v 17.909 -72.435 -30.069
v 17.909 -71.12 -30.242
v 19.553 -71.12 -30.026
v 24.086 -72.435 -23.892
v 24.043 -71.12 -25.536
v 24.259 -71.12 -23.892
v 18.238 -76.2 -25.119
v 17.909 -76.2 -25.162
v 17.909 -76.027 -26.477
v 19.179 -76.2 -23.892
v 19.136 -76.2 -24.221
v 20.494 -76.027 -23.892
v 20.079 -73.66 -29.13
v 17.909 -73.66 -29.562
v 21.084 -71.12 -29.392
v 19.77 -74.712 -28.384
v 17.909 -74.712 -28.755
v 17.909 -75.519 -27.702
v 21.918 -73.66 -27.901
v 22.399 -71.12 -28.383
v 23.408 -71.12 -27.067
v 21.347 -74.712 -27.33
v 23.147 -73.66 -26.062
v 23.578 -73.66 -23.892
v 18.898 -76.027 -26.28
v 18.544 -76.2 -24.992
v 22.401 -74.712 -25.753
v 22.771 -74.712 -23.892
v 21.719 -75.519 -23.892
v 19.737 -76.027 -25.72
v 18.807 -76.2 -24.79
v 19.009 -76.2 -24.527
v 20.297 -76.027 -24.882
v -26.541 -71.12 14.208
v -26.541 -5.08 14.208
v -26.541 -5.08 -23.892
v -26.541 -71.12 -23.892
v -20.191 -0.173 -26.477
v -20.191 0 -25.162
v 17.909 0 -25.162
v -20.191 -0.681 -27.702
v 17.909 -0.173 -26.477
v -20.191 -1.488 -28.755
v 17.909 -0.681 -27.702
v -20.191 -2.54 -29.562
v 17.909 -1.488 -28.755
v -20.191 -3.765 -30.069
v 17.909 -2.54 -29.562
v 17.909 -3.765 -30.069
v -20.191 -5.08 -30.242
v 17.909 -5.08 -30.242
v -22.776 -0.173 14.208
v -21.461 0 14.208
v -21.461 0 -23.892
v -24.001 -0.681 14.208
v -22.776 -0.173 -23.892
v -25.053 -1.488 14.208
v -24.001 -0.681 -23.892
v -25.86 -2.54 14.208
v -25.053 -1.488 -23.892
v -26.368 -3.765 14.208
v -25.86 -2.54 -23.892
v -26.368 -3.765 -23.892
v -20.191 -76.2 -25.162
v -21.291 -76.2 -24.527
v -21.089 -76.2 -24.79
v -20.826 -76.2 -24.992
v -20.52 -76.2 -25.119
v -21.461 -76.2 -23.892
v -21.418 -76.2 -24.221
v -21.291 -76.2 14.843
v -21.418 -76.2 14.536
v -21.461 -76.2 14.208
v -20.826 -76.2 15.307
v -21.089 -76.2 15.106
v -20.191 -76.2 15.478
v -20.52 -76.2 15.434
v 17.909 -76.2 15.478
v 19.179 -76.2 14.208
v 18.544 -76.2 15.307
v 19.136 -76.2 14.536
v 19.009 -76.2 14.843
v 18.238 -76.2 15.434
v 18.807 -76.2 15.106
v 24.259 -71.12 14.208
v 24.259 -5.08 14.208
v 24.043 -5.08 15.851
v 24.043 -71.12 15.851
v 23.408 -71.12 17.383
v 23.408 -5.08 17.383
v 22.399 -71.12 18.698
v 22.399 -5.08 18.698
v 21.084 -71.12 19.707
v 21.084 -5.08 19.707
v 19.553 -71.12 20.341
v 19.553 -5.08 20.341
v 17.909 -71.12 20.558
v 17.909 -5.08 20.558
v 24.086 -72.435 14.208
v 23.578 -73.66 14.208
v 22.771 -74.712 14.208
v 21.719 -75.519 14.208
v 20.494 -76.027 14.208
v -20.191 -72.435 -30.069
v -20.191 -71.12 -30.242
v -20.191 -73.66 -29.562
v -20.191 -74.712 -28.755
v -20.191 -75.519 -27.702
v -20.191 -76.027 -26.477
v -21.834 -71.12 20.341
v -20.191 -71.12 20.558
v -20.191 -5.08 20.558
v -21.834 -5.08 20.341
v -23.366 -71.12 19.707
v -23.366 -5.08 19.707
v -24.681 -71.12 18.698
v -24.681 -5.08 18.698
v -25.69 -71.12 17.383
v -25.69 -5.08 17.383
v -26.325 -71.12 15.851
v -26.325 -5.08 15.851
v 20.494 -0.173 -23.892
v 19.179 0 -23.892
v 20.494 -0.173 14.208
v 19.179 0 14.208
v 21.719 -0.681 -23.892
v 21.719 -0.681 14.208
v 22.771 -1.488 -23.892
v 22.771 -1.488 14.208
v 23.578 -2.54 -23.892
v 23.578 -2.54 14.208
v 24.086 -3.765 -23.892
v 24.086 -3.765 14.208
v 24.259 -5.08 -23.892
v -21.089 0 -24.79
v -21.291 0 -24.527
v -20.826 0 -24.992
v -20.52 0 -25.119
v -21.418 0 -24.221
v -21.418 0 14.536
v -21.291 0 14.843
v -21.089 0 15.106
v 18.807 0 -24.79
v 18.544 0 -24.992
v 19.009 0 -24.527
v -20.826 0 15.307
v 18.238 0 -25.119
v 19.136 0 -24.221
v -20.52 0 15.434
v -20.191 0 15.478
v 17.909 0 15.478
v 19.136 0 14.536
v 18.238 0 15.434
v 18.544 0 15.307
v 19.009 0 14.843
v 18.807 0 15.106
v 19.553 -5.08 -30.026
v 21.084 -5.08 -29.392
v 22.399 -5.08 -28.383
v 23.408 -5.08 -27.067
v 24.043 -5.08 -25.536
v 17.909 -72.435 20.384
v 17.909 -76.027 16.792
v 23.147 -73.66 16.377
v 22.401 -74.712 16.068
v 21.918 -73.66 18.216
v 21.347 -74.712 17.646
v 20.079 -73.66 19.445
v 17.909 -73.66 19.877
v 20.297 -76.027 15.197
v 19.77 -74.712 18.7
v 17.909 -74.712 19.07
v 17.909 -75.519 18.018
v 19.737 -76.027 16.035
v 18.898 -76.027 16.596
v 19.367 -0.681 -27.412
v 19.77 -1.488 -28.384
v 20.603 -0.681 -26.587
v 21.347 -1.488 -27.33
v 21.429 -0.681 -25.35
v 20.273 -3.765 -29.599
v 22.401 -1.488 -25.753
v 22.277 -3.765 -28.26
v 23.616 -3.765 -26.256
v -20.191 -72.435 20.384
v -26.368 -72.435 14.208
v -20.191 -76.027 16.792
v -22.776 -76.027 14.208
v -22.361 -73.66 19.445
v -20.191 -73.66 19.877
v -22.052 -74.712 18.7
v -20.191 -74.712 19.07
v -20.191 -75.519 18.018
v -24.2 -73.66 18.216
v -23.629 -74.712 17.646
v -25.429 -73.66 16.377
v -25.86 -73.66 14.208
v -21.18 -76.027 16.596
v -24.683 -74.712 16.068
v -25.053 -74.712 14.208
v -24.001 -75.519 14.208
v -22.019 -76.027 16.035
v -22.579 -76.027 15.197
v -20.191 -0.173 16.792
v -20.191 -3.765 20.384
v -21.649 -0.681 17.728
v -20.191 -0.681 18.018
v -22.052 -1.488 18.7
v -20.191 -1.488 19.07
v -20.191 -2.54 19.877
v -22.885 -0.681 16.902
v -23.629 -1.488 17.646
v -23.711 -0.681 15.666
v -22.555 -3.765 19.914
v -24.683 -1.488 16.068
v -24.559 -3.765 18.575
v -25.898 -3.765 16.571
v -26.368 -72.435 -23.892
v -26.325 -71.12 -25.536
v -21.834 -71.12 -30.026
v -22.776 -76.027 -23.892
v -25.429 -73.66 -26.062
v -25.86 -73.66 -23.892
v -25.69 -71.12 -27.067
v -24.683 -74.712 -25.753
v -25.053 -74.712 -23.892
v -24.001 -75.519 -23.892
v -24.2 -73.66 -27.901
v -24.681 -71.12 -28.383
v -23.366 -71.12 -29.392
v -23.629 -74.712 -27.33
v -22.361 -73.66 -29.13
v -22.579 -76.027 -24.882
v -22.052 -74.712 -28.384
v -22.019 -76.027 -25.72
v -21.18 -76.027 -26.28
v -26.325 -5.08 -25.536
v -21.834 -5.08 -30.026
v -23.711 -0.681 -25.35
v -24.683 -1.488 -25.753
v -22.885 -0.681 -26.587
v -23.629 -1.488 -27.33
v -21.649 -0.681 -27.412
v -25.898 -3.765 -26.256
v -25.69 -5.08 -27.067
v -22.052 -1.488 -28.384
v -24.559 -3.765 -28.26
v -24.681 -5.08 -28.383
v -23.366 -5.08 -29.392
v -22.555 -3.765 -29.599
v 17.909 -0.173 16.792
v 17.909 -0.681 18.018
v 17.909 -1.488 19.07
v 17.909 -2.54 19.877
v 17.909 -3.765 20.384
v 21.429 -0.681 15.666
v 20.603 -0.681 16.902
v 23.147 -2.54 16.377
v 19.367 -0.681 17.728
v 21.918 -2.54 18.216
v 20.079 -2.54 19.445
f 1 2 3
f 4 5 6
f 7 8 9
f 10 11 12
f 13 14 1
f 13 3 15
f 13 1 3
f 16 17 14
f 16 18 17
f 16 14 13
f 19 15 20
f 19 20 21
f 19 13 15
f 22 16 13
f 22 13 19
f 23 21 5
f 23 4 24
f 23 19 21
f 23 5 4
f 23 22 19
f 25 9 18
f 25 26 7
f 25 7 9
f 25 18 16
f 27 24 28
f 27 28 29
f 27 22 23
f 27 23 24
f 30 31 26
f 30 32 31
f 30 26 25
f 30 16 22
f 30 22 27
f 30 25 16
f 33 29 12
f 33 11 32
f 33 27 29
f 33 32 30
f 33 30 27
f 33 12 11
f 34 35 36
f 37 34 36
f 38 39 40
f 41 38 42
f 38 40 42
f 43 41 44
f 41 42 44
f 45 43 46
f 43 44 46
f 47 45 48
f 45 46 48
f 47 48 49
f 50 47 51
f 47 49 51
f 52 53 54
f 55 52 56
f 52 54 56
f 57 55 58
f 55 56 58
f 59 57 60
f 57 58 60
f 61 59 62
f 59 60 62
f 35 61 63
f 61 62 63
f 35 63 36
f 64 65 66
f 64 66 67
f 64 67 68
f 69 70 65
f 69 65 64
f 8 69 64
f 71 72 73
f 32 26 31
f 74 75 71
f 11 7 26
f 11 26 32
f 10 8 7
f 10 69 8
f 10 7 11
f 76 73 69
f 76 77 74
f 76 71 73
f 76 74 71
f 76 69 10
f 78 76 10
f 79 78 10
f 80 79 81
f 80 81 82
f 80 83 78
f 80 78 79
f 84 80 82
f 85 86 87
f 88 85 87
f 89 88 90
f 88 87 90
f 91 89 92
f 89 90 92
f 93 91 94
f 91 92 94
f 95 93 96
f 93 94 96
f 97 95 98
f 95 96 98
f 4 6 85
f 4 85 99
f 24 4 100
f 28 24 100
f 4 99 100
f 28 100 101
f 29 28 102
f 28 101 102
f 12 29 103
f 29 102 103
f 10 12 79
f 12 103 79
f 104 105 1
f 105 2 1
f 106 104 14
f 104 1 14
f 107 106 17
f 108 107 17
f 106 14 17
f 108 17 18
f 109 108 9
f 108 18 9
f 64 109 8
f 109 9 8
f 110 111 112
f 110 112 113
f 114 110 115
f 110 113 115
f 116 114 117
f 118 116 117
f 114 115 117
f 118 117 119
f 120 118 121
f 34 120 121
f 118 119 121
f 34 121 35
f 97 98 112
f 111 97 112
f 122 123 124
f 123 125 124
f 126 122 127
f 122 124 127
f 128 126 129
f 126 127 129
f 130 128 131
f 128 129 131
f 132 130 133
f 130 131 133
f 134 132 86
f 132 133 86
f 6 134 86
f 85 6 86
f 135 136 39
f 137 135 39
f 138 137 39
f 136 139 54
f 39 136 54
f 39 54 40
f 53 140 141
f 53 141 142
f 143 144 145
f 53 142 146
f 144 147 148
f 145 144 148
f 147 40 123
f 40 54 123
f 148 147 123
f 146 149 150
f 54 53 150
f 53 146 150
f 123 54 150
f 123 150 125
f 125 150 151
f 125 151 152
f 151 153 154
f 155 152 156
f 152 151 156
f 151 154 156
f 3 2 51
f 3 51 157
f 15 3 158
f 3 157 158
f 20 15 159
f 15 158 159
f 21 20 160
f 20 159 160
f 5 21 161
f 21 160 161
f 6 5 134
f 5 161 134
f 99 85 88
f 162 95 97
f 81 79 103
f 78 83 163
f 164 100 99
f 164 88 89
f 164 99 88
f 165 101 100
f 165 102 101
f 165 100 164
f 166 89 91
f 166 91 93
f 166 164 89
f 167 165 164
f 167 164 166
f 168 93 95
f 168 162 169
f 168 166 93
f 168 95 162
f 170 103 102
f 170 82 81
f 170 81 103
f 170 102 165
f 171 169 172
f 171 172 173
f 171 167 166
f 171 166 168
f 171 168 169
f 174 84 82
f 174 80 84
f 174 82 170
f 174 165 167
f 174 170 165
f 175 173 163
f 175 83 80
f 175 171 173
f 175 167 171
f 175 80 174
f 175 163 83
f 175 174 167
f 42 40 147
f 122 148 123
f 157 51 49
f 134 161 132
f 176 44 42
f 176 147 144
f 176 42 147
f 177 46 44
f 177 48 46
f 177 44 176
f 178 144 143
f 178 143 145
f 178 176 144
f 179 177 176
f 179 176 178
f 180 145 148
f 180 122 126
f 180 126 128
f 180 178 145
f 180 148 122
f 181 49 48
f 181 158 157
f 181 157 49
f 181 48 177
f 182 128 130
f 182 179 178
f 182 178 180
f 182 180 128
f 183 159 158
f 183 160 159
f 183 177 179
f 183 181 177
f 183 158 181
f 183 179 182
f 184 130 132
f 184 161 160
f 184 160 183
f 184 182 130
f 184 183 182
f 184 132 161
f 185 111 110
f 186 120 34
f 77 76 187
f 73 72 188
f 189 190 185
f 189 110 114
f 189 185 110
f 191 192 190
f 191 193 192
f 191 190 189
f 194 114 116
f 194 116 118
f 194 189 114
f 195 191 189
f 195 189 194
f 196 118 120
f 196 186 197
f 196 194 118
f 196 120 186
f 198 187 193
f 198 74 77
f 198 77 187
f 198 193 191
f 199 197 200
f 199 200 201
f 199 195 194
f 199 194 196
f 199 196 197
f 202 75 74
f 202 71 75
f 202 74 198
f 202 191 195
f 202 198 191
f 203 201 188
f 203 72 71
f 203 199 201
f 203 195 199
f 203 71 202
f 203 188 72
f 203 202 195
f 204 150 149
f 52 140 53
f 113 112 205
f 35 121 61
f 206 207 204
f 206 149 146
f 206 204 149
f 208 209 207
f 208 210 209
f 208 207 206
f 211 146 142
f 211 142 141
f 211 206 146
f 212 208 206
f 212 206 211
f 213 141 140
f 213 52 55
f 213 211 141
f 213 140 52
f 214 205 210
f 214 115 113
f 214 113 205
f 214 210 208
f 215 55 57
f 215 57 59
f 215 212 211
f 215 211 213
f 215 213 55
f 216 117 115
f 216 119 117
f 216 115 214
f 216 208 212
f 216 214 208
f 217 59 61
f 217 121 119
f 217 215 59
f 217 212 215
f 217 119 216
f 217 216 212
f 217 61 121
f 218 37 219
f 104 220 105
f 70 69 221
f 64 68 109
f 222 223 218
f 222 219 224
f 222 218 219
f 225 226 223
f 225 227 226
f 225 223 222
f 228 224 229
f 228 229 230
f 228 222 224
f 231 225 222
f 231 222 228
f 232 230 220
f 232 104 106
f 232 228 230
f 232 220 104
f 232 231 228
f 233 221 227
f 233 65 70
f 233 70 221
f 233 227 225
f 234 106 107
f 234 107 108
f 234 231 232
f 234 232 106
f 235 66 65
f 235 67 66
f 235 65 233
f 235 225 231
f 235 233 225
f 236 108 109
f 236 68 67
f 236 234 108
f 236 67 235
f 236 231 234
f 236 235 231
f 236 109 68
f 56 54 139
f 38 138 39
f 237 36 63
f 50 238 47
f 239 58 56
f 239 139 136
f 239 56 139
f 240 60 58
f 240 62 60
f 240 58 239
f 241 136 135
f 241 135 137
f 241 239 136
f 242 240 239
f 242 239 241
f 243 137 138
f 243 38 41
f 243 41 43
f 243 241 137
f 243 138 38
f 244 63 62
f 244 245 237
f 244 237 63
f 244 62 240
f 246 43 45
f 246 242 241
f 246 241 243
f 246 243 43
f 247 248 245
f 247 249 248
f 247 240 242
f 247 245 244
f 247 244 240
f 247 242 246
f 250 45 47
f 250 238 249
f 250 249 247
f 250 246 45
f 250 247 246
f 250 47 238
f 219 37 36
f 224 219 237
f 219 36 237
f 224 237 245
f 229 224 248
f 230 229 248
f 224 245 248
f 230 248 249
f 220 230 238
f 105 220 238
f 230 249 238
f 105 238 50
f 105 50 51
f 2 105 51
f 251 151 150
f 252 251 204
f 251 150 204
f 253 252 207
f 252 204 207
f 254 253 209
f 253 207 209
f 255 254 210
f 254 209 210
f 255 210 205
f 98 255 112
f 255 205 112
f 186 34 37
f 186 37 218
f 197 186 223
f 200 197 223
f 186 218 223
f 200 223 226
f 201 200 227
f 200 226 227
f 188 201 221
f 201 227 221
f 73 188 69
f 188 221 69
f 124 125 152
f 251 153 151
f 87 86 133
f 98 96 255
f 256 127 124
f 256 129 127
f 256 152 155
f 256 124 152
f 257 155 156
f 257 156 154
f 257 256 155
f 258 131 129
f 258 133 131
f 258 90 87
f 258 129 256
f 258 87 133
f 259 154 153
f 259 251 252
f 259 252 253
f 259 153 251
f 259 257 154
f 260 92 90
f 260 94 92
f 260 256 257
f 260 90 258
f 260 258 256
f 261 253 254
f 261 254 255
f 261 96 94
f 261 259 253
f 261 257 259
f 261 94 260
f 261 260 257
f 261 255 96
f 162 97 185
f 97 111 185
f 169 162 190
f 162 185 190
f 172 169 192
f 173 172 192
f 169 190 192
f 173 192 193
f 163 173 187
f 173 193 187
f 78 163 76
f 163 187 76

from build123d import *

# Parameters (mm, degrees)
F1_DEPTH = 25.4
F2_DEPTH = 50.8
F3_R     = 5.08
F4_R     = 5.08


with BuildPart() as f1:
    # F0 (on Front) → F1 (new body)
    with BuildSketch(Plane.XZ):
        with BuildLine():
            ThreePointArc((-20.1909632862, 20.5575729657), (-24.6810913467, 18.6977010262), (-26.5409632862, 14.2075729657))
            Line((-26.5409632862, 14.2075729657), (-26.5409632862, -23.8924270343))
            ThreePointArc((-26.5409632862, -23.8924270343), (-24.6810913467, -28.3825550948), (-20.1909632862, -30.2424270343))
            Line((-20.1909632862, -30.2424270343), (17.9090367138, -30.2424270343))
            ThreePointArc((17.9090367138, -30.2424270343), (22.3991647744, -28.3825550948), (24.2590367138, -23.8924270343))
            Line((24.2590367138, -23.8924270343), (24.2590367138, 14.2075729657))
            ThreePointArc((24.2590367138, 14.2075729657), (22.3991647744, 18.6977010262), (17.9090367138, 20.5575729657))
            Line((17.9090367138, 20.5575729657), (-20.1909632862, 20.5575729657))
        make_face()
    extrude(amount=F1_DEPTH)

    # F2 (add): a face of the model
    f2_faces = [f1.faces().sort_by_distance(p)[0] for p in [
        (-1.1409632862, -25.4, -4.8424270343),
    ]]
    extrude(f2_faces, amount=F2_DEPTH)

    # F3
    f3_edges = [f1.edges().sort_by_distance(p)[0] for p in [
        (-26.540963, -76.2, -4.842427),
    ]]
    fillet(f3_edges, radius=F3_R)

    # F4
    f4_edges = [f1.edges().sort_by_distance(p)[0] for p in [
        (22.399165, 0, 18.697701),
        (-1.140963, 0, 20.557573),
        (-24.681091, 0, 18.697701),
        (-26.540963, 0, -4.842427),
        (-24.681091, 0, -28.382555),
        (-1.140963, 0, -30.242427),
        (22.399165, 0, -28.382555),
        (24.259037, 0, -4.842427),
    ]]
    fillet(f4_edges, radius=F4_R)


solid = f1.part
